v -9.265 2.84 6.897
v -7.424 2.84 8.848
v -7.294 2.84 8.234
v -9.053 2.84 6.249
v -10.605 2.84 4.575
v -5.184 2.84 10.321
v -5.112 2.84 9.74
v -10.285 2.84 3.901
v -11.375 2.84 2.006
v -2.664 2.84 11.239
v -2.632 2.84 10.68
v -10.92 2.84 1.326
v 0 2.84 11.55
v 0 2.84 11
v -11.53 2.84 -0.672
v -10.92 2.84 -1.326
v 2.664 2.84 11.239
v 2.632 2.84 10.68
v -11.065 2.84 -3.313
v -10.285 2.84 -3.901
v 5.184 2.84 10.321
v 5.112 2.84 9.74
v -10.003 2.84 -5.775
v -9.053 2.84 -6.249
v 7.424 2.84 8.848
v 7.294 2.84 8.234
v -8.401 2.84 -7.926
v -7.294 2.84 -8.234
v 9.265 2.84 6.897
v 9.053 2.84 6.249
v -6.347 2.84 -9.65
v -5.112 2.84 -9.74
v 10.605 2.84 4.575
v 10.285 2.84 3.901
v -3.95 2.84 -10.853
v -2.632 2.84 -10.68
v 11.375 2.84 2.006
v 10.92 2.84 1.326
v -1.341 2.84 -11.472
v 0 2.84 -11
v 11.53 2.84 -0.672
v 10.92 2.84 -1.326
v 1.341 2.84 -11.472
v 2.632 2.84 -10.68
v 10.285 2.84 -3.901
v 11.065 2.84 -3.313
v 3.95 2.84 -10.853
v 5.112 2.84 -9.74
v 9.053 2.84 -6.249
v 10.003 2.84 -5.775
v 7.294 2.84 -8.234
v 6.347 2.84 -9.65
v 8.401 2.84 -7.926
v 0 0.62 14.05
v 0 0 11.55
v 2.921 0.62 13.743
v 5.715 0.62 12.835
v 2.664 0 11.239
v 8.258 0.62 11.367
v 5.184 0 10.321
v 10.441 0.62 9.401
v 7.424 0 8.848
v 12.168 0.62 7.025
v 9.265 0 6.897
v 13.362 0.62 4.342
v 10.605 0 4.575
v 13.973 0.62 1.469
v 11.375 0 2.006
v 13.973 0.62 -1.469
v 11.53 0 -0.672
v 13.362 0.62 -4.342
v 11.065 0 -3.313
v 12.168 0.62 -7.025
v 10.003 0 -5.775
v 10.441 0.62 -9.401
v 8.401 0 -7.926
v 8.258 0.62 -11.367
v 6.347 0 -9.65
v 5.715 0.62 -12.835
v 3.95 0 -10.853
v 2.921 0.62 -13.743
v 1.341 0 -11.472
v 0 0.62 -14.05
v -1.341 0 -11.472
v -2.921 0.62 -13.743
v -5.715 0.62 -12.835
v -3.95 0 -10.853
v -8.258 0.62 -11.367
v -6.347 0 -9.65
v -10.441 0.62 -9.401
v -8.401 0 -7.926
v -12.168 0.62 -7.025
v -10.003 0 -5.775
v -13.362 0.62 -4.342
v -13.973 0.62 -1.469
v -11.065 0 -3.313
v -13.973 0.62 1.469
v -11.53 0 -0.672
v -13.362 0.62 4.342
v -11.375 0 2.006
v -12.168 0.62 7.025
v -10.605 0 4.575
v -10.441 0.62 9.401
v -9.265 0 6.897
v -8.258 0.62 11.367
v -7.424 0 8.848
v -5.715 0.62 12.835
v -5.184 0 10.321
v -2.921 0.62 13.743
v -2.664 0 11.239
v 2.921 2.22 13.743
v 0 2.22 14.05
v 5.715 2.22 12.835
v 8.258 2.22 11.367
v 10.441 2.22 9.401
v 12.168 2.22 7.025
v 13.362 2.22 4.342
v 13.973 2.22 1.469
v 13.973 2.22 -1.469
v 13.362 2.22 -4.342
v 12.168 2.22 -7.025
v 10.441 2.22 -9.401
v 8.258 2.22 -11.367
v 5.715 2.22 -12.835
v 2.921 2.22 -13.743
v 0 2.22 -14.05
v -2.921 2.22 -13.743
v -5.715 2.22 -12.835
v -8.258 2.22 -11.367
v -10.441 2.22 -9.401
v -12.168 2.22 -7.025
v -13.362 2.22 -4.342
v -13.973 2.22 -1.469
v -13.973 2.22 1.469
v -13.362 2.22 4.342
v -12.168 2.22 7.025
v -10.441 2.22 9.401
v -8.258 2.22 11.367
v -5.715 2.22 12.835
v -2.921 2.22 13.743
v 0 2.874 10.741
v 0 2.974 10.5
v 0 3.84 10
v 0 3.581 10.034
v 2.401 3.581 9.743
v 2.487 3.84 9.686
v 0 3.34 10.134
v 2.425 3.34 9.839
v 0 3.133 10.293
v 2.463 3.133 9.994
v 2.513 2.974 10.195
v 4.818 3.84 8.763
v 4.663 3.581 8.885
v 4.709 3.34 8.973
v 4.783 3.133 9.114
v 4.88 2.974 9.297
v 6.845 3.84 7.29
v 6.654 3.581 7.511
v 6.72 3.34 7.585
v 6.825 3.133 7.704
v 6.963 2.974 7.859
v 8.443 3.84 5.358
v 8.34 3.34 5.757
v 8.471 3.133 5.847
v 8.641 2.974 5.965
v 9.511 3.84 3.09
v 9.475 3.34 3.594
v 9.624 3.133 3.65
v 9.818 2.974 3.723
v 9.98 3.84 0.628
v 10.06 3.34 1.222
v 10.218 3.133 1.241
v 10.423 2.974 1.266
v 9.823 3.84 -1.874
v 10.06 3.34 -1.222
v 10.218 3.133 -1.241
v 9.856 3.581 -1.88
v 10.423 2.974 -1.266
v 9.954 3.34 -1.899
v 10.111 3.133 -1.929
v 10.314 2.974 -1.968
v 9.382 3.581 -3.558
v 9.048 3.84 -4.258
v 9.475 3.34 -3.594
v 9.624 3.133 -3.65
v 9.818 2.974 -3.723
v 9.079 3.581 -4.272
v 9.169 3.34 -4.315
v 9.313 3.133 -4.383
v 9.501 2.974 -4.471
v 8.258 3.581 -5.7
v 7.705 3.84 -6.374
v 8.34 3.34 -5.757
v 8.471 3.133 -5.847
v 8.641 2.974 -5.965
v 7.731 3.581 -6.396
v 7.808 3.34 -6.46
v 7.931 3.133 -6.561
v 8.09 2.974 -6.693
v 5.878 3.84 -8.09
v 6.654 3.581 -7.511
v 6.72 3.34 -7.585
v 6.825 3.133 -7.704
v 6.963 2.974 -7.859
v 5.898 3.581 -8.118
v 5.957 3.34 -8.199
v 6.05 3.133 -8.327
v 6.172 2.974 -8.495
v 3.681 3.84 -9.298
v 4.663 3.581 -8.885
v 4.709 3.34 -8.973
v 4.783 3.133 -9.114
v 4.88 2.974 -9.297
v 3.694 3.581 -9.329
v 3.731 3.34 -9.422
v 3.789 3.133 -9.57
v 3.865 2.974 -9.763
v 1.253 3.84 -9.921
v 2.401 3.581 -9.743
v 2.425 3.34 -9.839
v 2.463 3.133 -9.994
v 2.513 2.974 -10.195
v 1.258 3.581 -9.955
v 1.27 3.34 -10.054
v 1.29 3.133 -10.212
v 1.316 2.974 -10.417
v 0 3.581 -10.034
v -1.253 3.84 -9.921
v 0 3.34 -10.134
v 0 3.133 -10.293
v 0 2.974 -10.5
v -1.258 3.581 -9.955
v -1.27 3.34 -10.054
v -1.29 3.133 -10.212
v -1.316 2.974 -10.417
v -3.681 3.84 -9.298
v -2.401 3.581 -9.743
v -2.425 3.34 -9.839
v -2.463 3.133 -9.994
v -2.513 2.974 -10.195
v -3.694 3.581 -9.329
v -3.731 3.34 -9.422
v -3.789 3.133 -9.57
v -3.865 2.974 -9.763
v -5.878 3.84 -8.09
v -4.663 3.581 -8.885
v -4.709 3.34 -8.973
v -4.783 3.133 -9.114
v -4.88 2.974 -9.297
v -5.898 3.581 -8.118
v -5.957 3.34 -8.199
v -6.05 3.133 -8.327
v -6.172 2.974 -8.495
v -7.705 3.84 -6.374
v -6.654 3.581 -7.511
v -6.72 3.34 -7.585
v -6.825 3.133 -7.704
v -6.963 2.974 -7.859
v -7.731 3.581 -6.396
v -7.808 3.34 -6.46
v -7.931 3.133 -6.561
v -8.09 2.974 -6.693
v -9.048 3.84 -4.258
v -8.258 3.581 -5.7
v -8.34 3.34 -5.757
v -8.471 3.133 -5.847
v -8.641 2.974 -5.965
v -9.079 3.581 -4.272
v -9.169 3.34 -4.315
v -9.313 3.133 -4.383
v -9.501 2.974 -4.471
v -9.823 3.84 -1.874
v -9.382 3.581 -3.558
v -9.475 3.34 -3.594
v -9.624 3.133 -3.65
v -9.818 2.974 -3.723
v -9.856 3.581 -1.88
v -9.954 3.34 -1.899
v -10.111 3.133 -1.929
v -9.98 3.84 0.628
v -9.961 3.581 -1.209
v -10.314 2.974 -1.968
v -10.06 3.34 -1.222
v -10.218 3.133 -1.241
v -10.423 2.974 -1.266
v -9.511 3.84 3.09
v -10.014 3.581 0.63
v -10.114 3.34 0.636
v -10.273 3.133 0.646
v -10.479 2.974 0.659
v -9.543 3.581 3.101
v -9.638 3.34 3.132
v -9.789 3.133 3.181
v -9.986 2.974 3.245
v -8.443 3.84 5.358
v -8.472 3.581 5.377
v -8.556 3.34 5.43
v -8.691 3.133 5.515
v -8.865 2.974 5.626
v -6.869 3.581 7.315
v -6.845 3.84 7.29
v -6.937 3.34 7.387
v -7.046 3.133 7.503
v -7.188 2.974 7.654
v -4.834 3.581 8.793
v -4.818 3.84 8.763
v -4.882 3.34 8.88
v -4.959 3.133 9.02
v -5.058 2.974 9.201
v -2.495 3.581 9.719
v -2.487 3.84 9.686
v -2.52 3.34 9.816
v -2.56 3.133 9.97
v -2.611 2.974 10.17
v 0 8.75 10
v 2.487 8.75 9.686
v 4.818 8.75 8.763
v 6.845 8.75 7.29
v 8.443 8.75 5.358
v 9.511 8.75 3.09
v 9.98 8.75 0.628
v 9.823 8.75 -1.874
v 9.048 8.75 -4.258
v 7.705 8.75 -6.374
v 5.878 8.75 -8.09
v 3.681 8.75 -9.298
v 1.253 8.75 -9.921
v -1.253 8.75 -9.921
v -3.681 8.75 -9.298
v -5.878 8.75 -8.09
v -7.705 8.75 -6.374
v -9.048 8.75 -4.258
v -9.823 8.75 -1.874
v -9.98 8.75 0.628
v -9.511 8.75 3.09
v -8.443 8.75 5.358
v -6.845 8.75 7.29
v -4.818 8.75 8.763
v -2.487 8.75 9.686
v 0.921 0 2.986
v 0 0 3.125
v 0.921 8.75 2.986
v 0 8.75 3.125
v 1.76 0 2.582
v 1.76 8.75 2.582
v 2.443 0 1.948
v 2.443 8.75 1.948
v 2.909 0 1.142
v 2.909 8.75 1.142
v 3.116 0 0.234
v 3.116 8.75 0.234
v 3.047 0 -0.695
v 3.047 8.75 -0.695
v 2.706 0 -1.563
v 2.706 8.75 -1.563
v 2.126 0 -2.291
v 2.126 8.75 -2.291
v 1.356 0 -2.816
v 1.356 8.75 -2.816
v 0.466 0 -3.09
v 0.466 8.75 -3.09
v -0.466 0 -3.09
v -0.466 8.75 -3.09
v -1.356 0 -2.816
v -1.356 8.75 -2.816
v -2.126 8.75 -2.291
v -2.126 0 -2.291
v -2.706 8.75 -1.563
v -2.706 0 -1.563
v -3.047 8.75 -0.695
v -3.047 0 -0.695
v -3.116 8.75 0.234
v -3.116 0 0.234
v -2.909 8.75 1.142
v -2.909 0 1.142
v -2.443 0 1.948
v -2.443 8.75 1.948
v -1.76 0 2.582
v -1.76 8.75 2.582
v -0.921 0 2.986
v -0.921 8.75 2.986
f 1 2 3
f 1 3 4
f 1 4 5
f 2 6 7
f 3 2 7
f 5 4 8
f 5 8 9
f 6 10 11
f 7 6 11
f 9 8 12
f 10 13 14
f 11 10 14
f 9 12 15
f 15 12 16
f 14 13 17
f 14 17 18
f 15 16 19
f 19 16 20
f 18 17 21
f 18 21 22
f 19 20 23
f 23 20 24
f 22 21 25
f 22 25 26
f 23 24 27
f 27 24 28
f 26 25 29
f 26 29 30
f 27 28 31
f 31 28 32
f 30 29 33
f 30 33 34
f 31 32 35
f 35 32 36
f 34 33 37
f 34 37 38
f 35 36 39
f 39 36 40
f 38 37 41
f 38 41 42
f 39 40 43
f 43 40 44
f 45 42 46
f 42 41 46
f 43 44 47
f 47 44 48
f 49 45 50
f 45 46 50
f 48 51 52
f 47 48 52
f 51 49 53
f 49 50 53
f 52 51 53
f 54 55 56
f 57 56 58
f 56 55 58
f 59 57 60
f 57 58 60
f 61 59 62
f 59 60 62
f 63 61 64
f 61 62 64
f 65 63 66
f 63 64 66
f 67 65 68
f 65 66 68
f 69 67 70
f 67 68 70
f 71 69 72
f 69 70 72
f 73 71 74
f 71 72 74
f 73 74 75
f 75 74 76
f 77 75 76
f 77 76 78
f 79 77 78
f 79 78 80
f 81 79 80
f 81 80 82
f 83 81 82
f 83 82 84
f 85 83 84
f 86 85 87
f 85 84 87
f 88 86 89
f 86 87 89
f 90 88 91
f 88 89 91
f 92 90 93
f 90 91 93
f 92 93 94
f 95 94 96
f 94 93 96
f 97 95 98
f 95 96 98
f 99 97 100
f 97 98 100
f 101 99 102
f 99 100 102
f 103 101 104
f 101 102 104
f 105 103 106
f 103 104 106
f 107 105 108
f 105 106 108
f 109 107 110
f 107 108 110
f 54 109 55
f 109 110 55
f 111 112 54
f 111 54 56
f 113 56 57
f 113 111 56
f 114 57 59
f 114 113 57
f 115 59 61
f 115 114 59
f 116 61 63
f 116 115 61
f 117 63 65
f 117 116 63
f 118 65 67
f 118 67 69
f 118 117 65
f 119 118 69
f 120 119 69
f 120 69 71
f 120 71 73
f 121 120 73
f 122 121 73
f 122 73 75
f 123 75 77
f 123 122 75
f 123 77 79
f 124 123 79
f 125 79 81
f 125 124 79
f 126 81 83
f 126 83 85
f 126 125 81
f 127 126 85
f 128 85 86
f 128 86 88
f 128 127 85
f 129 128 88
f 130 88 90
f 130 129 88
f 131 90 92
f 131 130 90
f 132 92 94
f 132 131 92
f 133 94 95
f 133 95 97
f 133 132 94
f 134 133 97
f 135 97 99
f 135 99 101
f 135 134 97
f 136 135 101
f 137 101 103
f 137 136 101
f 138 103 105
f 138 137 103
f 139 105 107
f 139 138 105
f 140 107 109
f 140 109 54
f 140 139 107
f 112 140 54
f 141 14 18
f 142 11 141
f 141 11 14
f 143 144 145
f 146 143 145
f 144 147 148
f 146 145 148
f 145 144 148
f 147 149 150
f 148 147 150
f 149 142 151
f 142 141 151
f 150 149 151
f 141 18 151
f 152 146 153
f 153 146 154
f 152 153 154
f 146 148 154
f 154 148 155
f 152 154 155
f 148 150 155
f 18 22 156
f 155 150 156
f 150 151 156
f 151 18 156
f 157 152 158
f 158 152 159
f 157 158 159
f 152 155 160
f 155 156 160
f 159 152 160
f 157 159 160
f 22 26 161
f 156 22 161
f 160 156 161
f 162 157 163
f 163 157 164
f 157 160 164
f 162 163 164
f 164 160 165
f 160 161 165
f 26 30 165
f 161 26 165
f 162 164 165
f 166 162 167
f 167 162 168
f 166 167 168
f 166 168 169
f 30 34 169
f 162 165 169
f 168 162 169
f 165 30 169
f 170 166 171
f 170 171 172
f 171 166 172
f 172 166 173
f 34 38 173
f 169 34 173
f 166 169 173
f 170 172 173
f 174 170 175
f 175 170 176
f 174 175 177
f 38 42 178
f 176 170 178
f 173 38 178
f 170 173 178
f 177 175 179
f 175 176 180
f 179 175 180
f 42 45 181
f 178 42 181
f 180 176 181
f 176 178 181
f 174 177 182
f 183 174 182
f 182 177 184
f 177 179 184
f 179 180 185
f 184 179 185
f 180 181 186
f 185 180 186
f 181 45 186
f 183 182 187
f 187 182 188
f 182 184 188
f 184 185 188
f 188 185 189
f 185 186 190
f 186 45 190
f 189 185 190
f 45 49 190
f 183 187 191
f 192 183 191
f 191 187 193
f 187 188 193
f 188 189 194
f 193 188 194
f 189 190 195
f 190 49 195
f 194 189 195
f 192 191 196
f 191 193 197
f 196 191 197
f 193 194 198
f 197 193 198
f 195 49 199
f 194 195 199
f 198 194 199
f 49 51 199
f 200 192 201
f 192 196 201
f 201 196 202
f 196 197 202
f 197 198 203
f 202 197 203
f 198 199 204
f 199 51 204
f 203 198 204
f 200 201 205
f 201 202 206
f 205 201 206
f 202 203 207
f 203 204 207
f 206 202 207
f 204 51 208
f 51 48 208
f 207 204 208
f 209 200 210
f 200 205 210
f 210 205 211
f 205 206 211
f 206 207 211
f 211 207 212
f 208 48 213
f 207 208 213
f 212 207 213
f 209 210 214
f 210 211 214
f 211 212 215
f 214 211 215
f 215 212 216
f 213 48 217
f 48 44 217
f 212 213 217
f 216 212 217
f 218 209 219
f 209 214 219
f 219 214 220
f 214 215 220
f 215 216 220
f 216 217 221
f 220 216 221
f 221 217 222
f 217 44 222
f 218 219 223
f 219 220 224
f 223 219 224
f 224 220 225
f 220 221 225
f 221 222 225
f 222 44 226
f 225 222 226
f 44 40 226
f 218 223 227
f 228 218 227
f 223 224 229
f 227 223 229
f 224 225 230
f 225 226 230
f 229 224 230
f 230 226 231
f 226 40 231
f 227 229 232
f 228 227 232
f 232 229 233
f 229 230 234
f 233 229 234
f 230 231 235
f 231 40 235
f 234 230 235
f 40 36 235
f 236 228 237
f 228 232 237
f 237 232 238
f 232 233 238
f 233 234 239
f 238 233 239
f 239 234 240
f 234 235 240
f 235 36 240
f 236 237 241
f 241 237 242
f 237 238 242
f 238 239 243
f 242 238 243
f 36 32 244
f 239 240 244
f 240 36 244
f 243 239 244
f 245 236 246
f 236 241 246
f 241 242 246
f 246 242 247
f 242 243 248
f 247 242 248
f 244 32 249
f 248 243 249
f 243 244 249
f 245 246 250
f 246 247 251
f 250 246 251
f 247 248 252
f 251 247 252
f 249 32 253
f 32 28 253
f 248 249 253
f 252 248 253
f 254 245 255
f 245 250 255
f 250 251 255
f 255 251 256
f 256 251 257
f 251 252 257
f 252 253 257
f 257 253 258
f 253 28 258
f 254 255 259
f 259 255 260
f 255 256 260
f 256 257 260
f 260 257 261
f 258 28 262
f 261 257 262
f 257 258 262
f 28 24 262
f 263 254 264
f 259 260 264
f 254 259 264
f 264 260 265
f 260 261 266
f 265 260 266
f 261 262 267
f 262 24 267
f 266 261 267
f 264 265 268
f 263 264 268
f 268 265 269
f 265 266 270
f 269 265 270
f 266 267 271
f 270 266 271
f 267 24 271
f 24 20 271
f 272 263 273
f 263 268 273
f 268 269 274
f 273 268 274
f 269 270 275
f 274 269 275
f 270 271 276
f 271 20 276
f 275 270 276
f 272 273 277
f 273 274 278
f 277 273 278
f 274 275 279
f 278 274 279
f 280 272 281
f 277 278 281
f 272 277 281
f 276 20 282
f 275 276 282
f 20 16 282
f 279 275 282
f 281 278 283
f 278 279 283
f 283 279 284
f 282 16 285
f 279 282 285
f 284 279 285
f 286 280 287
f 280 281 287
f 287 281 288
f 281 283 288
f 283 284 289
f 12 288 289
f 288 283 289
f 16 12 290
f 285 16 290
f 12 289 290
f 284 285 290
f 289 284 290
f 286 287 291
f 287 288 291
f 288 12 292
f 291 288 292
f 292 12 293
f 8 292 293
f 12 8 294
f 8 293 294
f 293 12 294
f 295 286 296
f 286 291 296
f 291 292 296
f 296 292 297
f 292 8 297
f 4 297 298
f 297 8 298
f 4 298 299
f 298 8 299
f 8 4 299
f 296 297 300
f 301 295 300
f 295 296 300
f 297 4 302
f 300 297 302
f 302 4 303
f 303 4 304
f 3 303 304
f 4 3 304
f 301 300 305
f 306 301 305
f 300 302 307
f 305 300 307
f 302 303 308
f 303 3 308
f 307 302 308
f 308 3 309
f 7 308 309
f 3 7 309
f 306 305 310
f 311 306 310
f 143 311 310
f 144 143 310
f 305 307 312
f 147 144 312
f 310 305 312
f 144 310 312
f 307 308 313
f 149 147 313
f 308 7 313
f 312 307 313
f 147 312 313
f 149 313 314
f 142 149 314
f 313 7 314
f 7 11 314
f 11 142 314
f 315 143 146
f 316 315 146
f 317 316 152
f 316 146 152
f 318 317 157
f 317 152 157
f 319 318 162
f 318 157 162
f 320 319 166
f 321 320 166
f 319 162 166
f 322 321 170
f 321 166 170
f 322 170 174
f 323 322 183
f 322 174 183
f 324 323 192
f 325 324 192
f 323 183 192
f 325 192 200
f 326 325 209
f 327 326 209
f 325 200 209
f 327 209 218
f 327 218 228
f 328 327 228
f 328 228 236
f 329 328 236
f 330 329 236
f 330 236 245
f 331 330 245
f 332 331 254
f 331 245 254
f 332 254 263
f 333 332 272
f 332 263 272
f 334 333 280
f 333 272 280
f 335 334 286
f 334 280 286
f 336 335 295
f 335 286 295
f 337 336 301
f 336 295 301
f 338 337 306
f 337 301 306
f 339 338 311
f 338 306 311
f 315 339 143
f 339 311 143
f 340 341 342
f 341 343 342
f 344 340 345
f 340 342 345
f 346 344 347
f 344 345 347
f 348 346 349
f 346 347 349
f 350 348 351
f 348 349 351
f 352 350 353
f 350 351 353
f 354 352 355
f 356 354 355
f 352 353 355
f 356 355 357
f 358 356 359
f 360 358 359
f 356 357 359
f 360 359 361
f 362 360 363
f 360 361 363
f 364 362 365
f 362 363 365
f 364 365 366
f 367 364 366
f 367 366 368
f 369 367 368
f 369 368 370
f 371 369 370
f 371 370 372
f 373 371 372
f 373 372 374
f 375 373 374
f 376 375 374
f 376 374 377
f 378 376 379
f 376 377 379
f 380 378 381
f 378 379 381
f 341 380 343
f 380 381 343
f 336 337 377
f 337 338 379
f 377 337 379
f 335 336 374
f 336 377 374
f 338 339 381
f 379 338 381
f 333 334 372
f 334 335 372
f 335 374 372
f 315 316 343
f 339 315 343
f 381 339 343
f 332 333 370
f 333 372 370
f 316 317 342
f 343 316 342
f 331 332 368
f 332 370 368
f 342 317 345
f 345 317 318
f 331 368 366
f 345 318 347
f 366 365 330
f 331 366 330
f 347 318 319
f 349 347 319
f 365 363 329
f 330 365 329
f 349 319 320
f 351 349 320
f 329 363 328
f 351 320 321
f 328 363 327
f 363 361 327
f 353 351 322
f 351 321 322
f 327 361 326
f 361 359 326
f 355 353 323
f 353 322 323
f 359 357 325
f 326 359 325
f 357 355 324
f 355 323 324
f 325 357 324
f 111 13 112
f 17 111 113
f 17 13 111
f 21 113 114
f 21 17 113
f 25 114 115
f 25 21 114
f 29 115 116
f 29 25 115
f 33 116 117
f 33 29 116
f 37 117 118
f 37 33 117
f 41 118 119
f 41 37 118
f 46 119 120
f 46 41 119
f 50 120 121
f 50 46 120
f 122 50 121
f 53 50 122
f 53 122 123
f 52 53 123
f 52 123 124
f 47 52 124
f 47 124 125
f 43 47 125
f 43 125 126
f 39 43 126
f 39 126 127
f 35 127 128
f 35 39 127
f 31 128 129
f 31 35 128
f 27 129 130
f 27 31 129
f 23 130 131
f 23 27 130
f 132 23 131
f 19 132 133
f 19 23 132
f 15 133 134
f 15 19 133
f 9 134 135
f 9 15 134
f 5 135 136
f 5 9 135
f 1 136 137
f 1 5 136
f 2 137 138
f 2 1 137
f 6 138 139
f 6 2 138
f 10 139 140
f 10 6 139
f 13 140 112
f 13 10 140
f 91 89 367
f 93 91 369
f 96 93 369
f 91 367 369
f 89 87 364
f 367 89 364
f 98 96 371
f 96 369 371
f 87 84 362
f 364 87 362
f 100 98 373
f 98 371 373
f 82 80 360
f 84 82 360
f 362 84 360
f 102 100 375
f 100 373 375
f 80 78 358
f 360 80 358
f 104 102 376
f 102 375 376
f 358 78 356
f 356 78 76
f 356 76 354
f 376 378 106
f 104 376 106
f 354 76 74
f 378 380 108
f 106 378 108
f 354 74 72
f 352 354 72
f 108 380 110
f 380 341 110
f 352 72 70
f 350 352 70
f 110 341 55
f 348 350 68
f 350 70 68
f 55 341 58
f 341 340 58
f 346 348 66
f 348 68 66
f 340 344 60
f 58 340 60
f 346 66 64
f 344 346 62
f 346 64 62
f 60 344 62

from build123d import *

# Parameters (mm, degrees)
F0_W     = 5.91
F0_H     = 6.875
F0_W_2   = 2.84
F0_H_2   = 4.05
F2_R     = 1
F3_SIZE2 = 2.5
F3_SIZE  = 0.62


with BuildPart() as f1:
    # F0 (on Right) → F1 (revolve)
    with BuildSketch(Plane.YZ):
        with Locations((5.795, 6.5625)):
            Rectangle(F0_W, F0_H)
        with Locations((1.42, 6.5625)):
            Rectangle(F0_W_2, F0_H)
        with Locations((1.42, 12.025)):
            Rectangle(F0_W_2, F0_H_2)
    revolve(axis=Axis((0, 4.375, 0), (0, 1, 0)))

    # F2
    f2_edges = [f1.edges().sort_by_distance(p)[0] for p in [
        (0, 2.84, -10),
    ]]
    fillet(f2_edges, radius=F2_R)

    # F3
    f3_edges = [f1.edges().sort_by_distance(p)[0] for p in [
        (0, 0, -14.05),
        (0, 2.84, -14.05),
    ]]
    f3_side = f1.faces().sort_by_distance((0, 1.42, -14.05))[0]
    chamfer(f3_edges, length=F3_SIZE, length2=F3_SIZE2, reference=f3_side)


solid = f1.part
